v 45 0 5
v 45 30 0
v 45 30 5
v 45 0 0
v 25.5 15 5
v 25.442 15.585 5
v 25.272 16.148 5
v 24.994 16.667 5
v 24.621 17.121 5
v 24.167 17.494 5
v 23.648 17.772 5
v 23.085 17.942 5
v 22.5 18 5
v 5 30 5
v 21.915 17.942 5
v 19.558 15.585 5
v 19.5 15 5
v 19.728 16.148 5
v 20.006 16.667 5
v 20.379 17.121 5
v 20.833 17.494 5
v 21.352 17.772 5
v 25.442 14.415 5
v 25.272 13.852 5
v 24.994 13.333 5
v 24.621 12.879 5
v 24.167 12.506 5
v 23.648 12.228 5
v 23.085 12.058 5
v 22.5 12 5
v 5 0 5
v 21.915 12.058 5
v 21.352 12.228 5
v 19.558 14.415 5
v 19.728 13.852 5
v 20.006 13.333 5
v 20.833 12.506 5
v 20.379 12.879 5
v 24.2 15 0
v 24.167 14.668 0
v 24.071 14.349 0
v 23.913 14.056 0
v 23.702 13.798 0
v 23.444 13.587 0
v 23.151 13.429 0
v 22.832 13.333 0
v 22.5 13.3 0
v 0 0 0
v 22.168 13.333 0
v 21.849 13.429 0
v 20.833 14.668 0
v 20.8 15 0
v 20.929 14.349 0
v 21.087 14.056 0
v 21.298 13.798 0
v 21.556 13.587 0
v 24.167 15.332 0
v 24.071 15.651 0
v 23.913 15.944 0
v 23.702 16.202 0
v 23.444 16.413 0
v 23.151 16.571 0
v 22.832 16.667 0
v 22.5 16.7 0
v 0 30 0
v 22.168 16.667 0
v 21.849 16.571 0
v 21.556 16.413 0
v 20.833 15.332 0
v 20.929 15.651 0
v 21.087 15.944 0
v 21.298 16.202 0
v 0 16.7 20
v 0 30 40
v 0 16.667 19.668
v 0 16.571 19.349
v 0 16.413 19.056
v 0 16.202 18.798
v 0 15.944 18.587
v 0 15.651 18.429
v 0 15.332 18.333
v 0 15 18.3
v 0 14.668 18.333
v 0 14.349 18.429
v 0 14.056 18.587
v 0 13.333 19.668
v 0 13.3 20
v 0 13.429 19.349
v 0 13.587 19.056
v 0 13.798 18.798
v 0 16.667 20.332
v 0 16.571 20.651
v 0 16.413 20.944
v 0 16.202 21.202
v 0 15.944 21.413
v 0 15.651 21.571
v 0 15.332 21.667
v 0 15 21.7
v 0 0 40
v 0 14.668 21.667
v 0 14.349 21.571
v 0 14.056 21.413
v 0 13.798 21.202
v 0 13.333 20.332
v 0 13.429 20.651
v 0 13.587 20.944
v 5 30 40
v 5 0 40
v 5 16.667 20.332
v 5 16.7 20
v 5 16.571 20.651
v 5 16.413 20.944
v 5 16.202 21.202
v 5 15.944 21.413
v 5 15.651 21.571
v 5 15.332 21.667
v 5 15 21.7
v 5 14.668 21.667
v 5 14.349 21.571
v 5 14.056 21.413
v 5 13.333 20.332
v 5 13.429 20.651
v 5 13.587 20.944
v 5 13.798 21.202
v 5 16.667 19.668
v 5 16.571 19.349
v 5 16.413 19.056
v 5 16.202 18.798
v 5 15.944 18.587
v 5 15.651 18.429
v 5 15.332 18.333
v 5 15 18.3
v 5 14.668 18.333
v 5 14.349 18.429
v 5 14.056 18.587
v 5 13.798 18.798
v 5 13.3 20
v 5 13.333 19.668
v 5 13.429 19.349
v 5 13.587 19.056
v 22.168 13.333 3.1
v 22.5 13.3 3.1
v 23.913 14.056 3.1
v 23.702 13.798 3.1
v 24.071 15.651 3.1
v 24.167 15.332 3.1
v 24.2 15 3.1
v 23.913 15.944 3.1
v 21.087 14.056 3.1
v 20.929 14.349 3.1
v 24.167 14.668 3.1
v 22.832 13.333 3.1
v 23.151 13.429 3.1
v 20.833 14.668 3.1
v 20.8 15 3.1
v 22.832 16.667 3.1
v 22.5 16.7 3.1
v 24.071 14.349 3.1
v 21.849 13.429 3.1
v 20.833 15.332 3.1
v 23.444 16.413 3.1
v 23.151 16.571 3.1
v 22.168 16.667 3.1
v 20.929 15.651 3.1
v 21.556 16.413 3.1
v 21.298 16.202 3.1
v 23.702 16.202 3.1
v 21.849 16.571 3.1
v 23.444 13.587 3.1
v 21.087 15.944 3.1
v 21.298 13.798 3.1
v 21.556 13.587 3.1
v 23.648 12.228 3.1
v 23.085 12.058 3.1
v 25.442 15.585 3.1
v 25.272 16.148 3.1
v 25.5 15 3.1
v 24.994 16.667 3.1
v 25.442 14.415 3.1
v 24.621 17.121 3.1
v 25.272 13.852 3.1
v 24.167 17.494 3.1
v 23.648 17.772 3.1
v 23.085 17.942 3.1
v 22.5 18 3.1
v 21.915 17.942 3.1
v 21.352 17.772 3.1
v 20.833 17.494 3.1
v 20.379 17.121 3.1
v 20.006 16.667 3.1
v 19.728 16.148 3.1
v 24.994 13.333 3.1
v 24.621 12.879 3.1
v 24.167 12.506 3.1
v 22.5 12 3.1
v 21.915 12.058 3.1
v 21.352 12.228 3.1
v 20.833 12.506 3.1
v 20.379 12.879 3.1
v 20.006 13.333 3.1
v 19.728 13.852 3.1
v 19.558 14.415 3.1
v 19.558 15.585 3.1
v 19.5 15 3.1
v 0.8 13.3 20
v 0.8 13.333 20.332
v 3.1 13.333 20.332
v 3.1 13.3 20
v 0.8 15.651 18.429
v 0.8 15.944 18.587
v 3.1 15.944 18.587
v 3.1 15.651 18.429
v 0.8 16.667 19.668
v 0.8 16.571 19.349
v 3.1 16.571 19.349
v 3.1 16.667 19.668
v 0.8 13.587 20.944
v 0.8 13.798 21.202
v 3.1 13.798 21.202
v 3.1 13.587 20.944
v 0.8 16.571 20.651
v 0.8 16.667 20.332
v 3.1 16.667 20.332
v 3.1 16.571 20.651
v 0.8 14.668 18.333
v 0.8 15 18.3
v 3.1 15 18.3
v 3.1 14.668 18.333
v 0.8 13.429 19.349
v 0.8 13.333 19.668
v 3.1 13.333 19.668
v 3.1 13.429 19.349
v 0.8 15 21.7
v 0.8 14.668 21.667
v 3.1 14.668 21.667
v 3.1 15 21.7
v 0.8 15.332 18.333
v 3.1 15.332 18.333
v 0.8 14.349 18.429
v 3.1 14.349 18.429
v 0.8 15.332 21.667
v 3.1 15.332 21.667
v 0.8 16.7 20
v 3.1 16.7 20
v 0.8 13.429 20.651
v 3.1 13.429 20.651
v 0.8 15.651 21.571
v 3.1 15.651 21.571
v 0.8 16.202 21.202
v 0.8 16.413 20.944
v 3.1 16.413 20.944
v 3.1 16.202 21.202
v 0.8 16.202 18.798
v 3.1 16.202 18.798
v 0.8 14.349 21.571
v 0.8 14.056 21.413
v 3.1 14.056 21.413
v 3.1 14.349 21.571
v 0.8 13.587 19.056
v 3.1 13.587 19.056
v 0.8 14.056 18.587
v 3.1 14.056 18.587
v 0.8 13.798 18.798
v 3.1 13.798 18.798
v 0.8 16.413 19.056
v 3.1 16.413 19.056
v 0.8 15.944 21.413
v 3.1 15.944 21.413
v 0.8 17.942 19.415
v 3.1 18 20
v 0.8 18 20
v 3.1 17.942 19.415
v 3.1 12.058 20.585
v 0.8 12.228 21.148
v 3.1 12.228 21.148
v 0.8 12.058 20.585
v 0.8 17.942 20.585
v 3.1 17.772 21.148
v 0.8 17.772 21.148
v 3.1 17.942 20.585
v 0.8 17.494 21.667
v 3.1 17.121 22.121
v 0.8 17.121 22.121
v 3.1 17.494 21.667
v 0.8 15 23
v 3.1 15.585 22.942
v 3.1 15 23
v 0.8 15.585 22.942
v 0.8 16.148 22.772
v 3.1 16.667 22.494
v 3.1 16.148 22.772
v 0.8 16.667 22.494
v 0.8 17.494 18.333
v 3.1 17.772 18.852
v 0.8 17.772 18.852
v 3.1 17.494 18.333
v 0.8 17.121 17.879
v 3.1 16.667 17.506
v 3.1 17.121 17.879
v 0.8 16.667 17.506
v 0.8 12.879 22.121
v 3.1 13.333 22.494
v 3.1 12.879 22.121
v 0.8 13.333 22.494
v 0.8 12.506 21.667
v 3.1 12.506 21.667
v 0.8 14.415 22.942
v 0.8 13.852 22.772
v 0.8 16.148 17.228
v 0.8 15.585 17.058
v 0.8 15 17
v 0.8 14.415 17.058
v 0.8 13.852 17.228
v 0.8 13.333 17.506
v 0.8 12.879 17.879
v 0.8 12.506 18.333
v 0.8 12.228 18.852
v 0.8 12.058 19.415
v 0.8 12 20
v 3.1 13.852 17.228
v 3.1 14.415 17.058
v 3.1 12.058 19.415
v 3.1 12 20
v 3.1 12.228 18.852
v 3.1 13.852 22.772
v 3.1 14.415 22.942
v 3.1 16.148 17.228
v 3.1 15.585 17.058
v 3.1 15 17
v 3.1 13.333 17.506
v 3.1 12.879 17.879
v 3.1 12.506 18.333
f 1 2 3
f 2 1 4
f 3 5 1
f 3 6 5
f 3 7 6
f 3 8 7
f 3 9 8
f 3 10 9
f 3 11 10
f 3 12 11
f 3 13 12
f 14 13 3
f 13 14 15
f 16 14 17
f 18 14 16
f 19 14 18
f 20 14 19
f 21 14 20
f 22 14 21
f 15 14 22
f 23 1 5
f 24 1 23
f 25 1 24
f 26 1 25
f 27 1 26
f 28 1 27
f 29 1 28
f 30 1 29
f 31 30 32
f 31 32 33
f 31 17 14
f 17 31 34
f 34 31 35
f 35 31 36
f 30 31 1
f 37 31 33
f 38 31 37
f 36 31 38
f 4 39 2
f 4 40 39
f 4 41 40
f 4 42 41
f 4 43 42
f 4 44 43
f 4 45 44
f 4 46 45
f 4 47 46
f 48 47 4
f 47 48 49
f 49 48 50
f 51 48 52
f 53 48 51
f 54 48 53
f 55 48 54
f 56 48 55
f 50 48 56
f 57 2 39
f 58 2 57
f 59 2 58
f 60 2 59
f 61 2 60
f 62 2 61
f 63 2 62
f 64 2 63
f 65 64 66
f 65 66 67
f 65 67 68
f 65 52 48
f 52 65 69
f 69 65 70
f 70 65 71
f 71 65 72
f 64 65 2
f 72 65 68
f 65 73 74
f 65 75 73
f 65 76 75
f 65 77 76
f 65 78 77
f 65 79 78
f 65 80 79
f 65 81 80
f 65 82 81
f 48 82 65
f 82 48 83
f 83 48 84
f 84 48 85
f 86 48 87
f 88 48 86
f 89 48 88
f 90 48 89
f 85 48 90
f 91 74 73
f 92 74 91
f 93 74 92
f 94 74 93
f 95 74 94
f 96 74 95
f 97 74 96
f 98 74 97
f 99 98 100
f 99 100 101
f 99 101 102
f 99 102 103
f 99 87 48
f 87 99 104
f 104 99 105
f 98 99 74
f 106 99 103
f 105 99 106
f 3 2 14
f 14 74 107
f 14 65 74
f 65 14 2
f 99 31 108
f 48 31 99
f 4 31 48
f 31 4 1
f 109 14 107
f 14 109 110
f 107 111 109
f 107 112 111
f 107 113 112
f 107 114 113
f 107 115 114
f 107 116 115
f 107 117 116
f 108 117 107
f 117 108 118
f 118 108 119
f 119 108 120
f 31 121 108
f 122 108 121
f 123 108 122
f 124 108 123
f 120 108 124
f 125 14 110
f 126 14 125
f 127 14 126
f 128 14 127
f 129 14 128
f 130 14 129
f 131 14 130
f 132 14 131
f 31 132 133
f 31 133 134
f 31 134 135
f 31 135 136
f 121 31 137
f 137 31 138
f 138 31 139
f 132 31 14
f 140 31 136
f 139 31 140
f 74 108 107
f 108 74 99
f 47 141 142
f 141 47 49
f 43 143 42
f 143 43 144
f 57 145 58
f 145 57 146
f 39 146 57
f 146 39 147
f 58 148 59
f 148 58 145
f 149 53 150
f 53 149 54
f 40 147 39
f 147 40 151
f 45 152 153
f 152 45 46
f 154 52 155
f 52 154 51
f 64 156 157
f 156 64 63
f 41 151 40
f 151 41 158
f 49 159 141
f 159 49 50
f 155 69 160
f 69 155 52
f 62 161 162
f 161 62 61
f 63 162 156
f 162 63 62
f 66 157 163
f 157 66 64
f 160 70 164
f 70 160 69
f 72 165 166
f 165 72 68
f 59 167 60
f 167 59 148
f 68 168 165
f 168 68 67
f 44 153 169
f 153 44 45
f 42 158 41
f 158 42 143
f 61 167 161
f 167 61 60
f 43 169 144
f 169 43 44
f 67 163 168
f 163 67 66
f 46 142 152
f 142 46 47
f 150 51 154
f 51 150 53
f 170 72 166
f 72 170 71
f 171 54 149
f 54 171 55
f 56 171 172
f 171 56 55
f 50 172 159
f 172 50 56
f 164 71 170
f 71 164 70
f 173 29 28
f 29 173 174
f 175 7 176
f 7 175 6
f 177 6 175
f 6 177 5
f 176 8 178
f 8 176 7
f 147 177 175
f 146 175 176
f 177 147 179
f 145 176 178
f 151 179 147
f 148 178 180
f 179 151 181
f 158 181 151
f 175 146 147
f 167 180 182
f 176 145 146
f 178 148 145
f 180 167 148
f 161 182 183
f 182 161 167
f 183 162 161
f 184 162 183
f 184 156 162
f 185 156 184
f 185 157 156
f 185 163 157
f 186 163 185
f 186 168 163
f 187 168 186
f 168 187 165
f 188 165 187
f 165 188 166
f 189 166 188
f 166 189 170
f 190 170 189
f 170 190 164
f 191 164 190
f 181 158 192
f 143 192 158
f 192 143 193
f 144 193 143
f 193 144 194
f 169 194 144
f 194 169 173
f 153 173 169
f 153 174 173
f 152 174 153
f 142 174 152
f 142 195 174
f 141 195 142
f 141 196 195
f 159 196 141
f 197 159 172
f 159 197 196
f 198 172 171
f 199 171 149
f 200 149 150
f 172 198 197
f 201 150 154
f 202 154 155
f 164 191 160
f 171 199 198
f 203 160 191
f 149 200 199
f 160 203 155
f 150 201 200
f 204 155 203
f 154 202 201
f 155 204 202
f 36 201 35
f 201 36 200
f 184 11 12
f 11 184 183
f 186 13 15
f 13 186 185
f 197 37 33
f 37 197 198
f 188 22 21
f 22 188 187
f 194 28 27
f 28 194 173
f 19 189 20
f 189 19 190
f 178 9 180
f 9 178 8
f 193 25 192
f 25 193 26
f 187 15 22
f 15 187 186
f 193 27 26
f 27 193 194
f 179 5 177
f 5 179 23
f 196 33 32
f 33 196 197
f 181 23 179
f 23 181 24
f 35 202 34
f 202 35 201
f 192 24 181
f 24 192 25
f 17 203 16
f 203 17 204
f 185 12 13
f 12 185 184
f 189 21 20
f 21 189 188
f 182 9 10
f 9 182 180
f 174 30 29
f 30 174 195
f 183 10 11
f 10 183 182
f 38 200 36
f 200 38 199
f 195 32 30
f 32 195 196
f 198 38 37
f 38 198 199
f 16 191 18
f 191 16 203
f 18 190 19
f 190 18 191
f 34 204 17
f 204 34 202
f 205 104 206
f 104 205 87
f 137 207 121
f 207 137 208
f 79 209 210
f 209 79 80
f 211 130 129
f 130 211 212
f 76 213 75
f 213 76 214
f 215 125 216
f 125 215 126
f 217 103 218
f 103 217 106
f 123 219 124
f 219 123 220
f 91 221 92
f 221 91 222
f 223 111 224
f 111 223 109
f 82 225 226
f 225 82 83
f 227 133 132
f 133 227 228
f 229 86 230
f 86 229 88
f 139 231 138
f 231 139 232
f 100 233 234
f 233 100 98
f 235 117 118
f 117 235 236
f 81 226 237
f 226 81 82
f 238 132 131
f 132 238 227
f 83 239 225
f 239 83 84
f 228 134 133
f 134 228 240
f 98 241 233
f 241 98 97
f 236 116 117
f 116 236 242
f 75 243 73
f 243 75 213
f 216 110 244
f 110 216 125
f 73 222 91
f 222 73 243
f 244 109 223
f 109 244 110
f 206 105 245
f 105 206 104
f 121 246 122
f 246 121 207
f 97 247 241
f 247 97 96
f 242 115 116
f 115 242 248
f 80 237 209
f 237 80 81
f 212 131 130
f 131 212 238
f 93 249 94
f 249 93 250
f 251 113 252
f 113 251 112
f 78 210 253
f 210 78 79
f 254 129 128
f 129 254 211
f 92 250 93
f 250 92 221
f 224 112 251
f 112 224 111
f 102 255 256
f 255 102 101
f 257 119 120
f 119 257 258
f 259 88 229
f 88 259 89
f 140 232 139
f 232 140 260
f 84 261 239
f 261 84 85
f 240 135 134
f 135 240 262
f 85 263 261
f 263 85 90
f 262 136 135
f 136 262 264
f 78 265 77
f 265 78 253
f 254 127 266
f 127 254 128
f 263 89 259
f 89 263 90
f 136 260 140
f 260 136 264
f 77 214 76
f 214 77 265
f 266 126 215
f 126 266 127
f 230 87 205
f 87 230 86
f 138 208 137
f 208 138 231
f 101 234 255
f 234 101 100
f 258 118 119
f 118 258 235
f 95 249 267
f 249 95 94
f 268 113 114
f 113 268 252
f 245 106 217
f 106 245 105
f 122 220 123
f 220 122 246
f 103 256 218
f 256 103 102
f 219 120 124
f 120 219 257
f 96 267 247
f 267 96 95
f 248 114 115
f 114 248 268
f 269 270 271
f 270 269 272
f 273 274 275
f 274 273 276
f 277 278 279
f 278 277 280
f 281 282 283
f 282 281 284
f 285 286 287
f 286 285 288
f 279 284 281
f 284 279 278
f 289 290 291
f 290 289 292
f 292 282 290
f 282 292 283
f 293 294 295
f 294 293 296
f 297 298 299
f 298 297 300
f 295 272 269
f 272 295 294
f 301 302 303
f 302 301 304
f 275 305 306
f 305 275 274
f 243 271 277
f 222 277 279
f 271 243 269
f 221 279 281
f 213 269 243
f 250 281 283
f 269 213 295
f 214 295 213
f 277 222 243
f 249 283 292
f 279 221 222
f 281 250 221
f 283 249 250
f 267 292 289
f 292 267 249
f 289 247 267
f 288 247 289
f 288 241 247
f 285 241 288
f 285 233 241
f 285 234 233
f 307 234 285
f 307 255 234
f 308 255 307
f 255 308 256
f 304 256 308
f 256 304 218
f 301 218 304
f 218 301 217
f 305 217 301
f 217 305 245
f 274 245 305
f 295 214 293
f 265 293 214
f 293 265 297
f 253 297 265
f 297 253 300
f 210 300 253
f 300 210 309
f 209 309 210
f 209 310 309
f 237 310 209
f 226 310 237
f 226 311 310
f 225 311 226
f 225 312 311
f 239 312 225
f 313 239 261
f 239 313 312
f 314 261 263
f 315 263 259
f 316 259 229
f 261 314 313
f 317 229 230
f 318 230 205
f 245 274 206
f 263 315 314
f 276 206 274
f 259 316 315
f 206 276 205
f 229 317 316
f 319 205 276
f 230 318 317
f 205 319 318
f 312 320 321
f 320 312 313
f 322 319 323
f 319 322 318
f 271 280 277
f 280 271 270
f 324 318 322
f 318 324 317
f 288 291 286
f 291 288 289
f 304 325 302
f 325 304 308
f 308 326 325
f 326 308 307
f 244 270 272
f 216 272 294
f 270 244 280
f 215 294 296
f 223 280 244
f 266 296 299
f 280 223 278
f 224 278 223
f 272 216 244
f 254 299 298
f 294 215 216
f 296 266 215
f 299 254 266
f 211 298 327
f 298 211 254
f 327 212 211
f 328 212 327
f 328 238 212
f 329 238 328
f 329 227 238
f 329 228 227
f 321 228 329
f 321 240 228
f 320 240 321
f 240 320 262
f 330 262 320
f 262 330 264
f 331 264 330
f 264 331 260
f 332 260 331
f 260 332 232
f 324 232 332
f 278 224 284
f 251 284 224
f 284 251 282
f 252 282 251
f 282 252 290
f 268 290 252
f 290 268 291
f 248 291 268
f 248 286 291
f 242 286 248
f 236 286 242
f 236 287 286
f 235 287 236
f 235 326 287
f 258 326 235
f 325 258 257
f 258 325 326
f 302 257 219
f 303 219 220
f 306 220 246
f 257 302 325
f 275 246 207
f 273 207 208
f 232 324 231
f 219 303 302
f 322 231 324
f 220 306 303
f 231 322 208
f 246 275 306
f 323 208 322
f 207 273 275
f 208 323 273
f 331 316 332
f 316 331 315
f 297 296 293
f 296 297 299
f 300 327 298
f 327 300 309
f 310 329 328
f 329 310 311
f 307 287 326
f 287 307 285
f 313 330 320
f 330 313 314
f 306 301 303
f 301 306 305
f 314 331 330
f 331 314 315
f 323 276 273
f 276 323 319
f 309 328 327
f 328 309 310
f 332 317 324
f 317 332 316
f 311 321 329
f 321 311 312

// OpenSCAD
$fn = 32;

// ----------------------------------------------------------------------
// L-bracket: 45 x 30 x 40 mm
// ----------------------------------------------------------------------

// --- parameters (mm) ---
arm_x = 45;               // horizontal leg, X
arm_z = 40;               // vertical leg, Z
width = 30;               // bracket depth, Y
wall = 5;                 // plate thickness
hole_d = 3.4;             // clearance for M3
cb_d = 6;                 // counterbore seat
cb_h = 1.9;               // counterbore depth

module hole_z(px, py) {
  translate([px, py, -2.5]) cylinder(h = wall + 5, d = hole_d);
}
module hole_x(pz, py) {
  translate([-2.5, py, pz]) rotate([0, 90, 0]) cylinder(h = wall + 5, d = hole_d);
}
module cb_z(px, py) {
  translate([px, py, wall - cb_h]) cylinder(h = cb_h + 0.4, d = cb_d);
}
module cb_x(pz, py) {
  translate([wall - cb_h, py, pz]) rotate([0, -90, 0]) cylinder(h = cb_h + 0.4, d = cb_d);
}

difference() {
  union() {
    /* horizontal leg */
    cube([arm_x, width, wall]);
    /* vertical leg, overlapping the corner block */
    cube([wall, width, arm_z]);
  }
  hole_z(22.5, 15);
  cb_z(22.5, 15);
  hole_x(20, 15);
  cb_x(20, 15);
}
